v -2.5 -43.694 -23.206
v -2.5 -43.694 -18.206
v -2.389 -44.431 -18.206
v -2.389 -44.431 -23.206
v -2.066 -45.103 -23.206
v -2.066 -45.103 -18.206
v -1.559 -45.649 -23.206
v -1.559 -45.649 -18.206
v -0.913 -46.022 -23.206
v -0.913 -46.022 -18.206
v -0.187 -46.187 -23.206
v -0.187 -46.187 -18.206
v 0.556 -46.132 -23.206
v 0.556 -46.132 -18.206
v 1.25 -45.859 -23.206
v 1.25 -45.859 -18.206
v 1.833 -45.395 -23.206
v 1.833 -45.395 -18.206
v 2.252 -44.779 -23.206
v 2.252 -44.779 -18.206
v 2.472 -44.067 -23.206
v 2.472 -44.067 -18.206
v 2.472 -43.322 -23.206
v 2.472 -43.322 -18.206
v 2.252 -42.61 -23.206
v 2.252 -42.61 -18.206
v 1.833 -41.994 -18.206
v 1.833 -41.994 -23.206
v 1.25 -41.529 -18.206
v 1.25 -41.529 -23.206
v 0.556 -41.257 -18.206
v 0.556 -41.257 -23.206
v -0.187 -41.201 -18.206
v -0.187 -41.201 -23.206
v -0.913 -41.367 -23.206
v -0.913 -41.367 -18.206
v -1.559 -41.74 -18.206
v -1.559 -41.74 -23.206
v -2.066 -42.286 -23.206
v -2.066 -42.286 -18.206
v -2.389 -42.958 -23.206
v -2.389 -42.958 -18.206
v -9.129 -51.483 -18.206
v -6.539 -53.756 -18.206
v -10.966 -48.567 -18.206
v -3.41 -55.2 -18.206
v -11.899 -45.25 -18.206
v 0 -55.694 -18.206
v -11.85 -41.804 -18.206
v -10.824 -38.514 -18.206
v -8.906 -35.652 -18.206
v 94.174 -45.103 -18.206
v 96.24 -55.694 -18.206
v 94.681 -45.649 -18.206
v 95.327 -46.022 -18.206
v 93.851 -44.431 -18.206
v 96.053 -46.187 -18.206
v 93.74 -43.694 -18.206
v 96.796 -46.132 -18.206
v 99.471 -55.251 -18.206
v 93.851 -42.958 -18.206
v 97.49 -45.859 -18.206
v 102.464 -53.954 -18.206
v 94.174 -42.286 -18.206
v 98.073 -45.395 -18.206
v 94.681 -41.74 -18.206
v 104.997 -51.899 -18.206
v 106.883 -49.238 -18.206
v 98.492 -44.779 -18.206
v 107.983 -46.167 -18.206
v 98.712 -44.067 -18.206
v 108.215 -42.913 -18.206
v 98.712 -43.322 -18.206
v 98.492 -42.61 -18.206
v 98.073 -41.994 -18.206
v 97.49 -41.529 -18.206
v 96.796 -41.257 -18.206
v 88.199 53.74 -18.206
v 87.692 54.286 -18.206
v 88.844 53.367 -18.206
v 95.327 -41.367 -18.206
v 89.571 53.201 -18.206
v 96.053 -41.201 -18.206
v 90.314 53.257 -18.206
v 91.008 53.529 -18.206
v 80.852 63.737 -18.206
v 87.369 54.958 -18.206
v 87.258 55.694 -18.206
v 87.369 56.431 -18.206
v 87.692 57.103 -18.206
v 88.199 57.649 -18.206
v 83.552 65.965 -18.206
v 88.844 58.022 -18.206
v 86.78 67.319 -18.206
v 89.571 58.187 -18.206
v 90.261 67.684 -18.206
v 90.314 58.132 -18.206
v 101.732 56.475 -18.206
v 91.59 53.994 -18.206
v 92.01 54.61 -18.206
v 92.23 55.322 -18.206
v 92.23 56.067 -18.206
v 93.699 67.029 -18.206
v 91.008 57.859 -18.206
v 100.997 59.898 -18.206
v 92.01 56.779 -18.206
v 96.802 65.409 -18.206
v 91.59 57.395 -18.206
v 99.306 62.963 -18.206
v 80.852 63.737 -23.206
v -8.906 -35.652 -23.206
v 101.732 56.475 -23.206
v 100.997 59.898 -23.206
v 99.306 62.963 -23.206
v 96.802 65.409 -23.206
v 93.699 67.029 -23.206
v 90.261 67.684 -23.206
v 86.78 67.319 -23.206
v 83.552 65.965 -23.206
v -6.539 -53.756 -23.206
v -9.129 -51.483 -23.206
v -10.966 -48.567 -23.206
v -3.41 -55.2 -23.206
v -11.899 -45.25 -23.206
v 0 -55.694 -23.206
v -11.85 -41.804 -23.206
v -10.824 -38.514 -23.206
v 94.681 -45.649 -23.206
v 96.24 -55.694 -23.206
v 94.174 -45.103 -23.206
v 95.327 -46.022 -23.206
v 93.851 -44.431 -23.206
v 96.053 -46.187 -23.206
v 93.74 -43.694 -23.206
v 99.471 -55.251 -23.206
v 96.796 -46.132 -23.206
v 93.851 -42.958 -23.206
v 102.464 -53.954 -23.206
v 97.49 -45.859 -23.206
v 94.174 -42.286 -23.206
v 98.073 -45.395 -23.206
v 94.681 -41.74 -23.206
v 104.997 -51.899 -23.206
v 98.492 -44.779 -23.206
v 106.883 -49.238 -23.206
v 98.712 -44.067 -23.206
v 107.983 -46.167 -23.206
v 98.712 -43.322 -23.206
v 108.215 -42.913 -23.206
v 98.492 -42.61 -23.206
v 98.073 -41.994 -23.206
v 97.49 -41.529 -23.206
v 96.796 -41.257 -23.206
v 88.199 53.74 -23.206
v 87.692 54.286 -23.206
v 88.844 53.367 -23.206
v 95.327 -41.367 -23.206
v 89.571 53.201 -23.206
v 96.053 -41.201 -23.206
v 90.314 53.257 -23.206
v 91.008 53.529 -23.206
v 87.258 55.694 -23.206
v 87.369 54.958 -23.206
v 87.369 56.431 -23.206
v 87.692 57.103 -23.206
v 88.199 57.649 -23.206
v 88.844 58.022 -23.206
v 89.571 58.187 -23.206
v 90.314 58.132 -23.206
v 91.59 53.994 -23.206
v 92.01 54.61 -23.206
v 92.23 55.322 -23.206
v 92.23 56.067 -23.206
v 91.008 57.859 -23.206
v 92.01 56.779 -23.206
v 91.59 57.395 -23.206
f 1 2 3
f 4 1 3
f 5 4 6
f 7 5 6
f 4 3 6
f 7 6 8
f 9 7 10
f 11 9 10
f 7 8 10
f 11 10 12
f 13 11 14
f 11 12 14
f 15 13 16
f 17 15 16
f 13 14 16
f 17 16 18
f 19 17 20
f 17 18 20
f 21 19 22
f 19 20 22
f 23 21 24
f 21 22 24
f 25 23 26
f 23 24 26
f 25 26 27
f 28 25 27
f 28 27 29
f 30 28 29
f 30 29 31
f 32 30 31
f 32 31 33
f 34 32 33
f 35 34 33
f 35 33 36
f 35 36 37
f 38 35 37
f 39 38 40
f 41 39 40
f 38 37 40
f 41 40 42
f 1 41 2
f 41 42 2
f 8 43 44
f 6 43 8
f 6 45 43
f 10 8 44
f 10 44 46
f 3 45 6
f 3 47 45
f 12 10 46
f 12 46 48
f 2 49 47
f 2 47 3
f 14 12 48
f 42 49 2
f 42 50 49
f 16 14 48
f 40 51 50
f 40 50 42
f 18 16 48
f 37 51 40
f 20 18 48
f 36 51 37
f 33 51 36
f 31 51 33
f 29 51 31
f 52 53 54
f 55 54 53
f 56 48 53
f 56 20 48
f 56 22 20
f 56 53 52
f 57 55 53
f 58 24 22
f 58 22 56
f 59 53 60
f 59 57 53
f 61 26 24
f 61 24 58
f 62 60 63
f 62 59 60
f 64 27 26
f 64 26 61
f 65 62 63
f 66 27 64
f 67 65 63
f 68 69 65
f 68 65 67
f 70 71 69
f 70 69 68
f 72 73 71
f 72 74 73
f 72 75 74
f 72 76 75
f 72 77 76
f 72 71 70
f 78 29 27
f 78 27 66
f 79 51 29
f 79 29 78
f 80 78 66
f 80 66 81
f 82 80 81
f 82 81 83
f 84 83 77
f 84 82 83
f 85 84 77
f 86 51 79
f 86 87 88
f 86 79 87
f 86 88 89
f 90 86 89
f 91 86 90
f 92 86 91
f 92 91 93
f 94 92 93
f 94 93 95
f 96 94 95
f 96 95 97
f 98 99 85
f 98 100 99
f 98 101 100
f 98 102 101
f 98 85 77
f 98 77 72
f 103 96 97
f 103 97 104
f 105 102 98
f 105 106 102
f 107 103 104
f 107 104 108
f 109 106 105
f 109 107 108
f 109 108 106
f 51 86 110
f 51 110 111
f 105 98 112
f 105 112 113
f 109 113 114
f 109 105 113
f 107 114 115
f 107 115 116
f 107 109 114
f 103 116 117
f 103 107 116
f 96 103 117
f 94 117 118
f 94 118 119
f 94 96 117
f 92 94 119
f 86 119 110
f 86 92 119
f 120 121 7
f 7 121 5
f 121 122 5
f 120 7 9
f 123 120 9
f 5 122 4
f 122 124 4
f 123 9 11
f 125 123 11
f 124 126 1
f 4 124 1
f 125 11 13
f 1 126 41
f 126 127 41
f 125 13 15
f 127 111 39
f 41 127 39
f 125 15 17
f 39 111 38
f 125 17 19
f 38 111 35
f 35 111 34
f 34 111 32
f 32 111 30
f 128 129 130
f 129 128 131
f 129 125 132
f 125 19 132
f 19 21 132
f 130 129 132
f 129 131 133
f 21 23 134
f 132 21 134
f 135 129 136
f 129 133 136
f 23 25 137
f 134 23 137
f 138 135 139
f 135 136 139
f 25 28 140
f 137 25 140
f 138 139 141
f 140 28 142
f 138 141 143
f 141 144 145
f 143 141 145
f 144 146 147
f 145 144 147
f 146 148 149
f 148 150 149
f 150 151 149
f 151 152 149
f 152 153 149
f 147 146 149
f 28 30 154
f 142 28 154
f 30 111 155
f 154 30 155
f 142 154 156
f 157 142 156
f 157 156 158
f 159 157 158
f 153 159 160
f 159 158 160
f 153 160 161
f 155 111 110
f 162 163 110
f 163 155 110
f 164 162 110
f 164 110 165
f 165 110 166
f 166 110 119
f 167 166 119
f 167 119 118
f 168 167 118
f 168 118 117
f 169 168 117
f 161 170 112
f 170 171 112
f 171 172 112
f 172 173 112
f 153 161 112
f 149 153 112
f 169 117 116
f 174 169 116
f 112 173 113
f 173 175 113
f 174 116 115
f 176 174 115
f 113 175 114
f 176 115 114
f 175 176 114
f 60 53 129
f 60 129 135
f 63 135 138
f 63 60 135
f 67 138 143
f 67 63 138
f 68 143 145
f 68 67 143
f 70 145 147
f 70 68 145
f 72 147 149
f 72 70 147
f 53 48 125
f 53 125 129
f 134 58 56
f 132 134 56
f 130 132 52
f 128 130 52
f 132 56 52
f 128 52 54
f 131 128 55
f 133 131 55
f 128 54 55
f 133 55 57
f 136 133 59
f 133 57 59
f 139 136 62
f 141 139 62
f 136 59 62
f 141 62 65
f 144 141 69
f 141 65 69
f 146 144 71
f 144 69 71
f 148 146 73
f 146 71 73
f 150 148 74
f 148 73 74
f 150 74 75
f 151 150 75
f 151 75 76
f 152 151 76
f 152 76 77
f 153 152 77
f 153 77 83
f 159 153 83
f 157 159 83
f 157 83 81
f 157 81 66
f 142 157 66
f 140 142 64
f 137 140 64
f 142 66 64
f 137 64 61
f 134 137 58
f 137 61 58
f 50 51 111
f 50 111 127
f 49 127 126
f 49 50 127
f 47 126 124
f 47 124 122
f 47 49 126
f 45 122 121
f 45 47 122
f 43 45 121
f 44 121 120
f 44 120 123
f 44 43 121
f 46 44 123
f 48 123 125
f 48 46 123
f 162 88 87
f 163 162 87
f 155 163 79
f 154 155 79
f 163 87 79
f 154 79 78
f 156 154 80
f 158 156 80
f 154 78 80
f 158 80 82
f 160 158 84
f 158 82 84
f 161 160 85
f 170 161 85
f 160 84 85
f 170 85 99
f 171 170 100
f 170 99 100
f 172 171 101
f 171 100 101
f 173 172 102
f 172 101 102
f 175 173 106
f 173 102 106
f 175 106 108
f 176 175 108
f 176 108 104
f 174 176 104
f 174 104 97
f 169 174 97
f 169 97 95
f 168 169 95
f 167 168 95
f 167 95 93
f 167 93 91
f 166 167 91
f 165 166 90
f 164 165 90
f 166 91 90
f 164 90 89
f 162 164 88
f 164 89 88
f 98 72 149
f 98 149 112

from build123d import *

# Parameters (mm, degrees)
SKETCH_1_R      = 2.5
EXTRUDE_1_DEPTH = 5


with BuildPart() as part:
    # 草图1 → 凸台-拉伸1 (new body)
    with BuildSketch(Plane.XY.offset(-18.206005243)):
        with BuildLine():
            Line((108.214557081, -42.91340116), (101.732163058, 56.475423815))
            ThreePointArc((101.732163058, 56.475423815), (93.699392778, 67.028534207), (80.851797136, 63.737208711))
            Line((80.851797136, 63.737208711), (-8.905808702, -35.651616247))
            ThreePointArc((-8.905808702, -35.651616247), (-10.966165116, -48.567114254), (0, -55.694412478))
            Line((0, -55.694412478), (96.239999844, -55.694412478))
            ThreePointArc((96.239999844, -55.694412478), (104.997058016, -51.898919293), (108.214557081, -42.91340116))
        make_face()
        with Locations(Location((89.757605827, 55.694412486, 0), (0, 0, 180))):
            Circle(SKETCH_1_R, mode=Mode.SUBTRACT)
        with Locations(Location((96.239999844, -43.694412489, 0), (0, 0, 180))):
            Circle(SKETCH_1_R, mode=Mode.SUBTRACT)
        with Locations(Location((0, -43.694412482, 0), (0, 0, 180))):
            Circle(SKETCH_1_R, mode=Mode.SUBTRACT)
    extrude(amount=-EXTRUDE_1_DEPTH)


solid = part.part
